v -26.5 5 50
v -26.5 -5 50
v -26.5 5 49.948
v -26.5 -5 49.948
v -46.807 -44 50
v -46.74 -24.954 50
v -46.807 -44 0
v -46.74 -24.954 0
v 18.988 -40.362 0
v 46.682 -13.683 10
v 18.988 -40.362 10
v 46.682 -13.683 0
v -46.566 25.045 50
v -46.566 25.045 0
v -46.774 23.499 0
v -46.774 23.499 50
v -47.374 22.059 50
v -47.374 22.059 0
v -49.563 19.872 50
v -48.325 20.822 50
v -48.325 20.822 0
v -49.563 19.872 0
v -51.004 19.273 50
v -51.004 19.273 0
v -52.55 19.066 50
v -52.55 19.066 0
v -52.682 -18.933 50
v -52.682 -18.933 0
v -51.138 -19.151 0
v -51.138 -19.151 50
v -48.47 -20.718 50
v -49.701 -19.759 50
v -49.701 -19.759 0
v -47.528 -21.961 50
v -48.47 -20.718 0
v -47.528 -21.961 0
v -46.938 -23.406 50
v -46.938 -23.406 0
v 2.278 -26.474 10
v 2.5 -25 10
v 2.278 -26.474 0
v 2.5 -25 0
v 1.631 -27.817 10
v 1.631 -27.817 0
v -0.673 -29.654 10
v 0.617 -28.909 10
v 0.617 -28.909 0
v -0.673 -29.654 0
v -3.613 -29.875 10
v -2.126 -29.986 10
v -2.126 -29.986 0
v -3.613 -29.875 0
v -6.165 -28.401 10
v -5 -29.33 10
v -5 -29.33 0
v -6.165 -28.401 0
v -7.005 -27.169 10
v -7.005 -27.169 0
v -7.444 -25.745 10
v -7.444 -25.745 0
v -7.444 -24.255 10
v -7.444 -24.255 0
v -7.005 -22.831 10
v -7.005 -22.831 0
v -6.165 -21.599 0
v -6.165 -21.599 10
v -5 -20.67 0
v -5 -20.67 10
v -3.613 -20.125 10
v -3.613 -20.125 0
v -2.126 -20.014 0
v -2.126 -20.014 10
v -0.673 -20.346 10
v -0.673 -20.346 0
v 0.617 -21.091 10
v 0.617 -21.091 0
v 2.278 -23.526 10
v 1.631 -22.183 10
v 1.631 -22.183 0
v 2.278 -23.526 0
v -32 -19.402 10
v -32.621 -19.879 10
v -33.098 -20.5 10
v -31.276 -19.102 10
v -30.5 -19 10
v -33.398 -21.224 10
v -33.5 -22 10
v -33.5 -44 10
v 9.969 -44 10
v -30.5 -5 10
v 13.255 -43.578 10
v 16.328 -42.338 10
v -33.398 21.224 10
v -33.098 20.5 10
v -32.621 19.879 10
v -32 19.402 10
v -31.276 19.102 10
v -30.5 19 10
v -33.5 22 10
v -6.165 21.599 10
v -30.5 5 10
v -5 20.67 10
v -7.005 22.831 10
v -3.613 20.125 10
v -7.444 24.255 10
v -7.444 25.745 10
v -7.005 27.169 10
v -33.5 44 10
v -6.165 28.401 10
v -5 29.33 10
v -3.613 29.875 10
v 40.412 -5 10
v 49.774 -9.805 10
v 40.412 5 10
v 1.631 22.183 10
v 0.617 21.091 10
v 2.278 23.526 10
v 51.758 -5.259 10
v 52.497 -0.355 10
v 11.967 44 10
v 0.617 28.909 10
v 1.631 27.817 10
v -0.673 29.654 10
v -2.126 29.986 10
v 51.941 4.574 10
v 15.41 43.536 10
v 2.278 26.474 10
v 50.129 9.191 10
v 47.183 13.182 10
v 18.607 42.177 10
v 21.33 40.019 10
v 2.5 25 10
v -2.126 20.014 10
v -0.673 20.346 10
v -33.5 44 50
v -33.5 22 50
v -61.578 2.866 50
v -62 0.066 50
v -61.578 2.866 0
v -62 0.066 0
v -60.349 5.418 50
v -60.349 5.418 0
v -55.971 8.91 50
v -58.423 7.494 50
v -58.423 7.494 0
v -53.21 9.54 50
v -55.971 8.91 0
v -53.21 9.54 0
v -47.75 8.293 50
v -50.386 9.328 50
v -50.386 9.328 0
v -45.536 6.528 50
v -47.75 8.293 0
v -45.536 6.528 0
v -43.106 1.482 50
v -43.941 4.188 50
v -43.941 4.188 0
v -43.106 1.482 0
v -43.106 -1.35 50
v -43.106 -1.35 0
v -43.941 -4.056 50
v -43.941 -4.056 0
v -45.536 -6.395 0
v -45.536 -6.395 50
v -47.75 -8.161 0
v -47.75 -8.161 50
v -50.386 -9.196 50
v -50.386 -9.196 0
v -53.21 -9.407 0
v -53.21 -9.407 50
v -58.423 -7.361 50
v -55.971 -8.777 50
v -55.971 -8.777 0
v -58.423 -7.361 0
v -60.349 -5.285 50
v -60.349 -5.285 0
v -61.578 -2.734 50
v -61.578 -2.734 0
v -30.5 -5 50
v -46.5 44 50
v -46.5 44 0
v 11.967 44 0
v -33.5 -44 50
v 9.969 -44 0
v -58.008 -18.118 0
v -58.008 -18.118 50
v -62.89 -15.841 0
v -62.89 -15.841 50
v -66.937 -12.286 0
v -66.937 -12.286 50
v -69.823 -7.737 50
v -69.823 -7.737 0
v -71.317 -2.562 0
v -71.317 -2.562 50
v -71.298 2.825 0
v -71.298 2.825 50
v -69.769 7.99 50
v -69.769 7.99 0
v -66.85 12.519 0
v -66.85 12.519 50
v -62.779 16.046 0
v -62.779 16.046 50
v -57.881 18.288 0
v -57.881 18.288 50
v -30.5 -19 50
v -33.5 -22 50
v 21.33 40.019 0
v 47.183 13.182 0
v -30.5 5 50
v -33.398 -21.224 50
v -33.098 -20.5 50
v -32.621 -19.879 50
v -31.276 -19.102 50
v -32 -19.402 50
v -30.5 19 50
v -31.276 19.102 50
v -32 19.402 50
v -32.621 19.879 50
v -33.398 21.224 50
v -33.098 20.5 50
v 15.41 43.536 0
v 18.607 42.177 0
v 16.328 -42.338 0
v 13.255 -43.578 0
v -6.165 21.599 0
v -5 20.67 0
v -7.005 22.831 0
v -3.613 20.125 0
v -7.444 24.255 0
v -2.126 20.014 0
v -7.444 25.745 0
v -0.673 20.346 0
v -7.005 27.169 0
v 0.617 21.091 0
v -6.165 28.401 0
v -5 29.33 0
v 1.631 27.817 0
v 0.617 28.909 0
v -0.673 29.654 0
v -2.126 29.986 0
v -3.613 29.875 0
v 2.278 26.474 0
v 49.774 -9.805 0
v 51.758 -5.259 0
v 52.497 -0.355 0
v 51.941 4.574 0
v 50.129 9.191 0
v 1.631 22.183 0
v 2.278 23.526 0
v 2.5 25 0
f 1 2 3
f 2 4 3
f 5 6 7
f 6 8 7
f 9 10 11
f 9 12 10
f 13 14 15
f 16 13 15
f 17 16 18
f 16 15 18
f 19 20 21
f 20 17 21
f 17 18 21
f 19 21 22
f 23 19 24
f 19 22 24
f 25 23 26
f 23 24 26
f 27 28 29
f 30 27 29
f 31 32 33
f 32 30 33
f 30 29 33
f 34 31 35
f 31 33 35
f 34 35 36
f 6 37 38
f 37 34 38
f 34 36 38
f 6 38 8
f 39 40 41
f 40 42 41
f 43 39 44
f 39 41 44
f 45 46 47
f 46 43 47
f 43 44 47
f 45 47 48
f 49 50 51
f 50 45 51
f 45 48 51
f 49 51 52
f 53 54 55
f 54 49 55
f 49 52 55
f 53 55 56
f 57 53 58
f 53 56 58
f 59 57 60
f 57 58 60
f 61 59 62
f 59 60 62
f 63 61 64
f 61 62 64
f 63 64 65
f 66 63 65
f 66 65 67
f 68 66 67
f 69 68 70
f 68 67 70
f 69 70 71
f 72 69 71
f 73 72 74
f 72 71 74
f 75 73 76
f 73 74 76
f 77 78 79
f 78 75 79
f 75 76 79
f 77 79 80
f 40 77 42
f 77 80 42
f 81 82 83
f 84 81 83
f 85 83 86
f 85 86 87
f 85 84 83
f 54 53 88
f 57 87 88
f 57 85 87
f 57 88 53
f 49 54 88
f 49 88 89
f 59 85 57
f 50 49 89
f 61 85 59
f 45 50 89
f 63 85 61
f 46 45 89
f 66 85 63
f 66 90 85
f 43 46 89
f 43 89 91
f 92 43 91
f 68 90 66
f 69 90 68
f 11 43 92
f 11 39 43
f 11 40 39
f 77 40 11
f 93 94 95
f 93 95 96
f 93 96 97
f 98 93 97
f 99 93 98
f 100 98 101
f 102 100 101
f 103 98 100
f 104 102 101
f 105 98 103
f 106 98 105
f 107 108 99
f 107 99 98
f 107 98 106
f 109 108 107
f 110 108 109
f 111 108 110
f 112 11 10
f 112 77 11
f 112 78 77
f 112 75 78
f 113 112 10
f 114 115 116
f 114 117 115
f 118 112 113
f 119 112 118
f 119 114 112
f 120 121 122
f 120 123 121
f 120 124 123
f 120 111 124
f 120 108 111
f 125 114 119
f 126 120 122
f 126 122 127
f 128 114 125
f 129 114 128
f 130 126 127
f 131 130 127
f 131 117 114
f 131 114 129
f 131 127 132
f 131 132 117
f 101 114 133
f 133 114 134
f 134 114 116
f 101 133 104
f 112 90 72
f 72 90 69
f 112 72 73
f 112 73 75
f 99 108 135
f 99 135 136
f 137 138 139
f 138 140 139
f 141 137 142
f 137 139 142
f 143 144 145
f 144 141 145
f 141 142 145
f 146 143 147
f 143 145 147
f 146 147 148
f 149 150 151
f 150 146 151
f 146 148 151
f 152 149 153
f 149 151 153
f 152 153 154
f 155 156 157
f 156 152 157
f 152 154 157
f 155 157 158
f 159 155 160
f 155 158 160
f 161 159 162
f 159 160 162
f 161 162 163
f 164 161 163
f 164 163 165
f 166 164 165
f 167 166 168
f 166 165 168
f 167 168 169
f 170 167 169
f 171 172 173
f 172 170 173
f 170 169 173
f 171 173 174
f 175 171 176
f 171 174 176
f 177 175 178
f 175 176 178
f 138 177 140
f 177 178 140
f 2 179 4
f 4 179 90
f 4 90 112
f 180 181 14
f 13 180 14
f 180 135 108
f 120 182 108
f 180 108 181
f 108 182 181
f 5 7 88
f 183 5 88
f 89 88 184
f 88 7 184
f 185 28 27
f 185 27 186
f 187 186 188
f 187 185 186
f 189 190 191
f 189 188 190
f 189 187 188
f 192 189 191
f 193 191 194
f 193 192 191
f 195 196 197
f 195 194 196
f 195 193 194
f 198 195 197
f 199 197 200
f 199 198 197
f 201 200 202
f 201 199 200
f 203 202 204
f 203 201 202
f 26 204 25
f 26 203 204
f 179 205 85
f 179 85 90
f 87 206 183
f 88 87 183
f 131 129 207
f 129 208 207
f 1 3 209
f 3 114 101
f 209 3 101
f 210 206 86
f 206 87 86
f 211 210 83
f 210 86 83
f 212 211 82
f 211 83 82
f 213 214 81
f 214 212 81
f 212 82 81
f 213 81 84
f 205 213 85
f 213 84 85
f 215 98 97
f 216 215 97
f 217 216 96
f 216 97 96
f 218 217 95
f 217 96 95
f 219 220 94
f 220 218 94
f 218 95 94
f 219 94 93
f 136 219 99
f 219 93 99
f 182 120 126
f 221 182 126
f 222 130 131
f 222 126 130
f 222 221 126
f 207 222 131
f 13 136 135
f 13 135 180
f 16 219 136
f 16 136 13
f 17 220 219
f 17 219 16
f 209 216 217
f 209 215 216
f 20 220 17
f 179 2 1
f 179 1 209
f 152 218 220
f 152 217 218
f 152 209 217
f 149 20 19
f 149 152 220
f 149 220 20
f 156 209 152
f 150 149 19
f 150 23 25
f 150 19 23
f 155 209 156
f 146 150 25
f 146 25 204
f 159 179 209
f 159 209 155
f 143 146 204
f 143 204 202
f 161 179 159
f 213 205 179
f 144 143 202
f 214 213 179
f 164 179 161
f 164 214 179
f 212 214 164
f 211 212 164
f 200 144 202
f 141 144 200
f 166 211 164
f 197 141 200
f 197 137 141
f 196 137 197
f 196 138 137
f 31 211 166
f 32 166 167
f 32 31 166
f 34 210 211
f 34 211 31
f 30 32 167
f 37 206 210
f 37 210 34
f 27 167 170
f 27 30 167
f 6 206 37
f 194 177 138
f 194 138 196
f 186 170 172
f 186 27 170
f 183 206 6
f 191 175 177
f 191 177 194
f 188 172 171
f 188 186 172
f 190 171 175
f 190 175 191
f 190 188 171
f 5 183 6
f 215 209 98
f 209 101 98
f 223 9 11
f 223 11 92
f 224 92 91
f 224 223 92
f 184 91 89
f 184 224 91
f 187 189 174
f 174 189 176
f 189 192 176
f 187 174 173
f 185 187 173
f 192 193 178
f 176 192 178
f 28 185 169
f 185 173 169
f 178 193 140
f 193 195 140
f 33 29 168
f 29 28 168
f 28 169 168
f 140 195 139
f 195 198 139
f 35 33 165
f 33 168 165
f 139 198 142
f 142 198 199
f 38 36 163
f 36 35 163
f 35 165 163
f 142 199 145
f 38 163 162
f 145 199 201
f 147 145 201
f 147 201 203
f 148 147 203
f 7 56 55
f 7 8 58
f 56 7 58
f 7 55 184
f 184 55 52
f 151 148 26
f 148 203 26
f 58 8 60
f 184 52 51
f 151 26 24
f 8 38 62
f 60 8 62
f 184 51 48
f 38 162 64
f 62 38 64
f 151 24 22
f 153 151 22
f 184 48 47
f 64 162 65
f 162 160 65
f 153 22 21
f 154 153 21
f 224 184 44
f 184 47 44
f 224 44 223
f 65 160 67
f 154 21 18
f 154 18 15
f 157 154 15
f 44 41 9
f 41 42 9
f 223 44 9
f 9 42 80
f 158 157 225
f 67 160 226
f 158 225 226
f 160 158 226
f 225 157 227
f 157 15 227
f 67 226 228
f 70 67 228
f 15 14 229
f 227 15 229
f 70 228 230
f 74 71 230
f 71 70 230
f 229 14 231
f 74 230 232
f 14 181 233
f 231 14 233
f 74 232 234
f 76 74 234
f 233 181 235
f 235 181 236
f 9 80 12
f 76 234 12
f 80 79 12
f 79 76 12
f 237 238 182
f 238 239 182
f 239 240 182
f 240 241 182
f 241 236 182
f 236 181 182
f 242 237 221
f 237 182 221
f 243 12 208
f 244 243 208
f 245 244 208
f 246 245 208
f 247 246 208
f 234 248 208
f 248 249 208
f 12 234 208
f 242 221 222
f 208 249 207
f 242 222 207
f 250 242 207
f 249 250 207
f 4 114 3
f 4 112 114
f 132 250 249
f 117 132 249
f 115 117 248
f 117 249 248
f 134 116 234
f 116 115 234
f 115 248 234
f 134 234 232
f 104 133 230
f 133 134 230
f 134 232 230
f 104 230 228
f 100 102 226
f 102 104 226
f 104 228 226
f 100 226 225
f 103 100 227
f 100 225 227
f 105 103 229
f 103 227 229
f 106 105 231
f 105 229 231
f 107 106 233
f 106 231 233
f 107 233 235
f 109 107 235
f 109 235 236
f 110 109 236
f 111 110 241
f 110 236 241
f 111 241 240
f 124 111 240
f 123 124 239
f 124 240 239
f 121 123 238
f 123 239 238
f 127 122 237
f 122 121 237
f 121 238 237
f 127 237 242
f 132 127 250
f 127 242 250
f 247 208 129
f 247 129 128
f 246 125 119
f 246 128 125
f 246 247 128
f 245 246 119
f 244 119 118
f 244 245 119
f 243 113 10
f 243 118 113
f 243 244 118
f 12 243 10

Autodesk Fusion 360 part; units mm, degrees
sketch "Sketch1" plane through (0, 0, 0) normal (0, 0, 1) x (1, 0, 0)
  line L0 (9.969, -44) -> (-33.5, -44)
  line L1 (-33.5, -44) -> (-33.5, 44)
  line L2 (-33.5, 44) -> (11.9673, 44)
  arc A0 (46.682, -13.6834) -> (47.1834, 13.182) centre (33.5, 0) ccw
  line L3 (46.682, -13.6834) -> (18.9882, -40.3623)
  line L4 (47.1834, 13.182) -> (21.3296, 40.0192)
  circle A1 centre (-2.5, 25) radius 5
  circle A2 centre (-2.5, -25) radius 5
  arc A3 (21.3296, 40.0192) -> (11.9673, 44) centre (11.9673, 31) ccw
  line L5 (33.5, 27.3859) -> (33.5, 25)
  line L6 (33.5, -25) -> (33.5, -26.3823)
  line L7 (-2.5, -25) -> (-1.5636, -25) construction
  arc A4 (9.969, -44) -> (18.9882, -40.3623) centre (9.969, -31) ccw
  dimension "d4" = 88
  dimension "d6" = 19
  dimension "d10" = 10
  dimension "d11" = 10
extrude "Extrude1" add sketch "Sketch1" along normal blind 10 makes body 1
sketch "Sketch2" plane through (0, 0, 10) normal (0, 0, 1) x (-1, 0, 0)
  circle A0 centre (2.5, -25) radius 5
  circle A1 centre (2.5, 25) radius 5
  line L0 (33.5, 44) -> (-9.969, 44)
  arc A2 (-9.969, 44) -> (-18.9882, 40.3623) centre (-9.969, 31) ccw
  line L1 (-18.9882, 40.3623) -> (-46.682, 13.6834)
  arc A3 (-46.682, 13.6834) -> (-47.1834, -13.182) centre (-33.5, 0) ccw
  line L2 (-47.1834, -13.182) -> (-21.3296, -40.0192)
  arc A4 (-21.3296, -40.0192) -> (-11.9673, -44) centre (-11.9673, -31) ccw
  line L3 (-11.9673, -44) -> (33.5, -44)
  line L4 (33.5, -44) -> (33.5, 44)
  line L5 (46.8066, 44) -> (33.5, 44)
  line L6 (30.5, 19) -> (30.5, 5)
  line L7 (30.5, 5) -> (26.5, 5)
  line L8 (26.5, 5) -> (26.5, -5)
  line L9 (26.5, -5) -> (30.5, -5)
  line L10 (30.5, -5) -> (30.5, -19)
  line L11 (33.5, -44) -> (46.5, -44)
  line L12 (33.5, 0) -> (52.4999, -0.0662) construction
  circle A5 centre (52.4999, -0.0662) radius 9.5
  line L13 (46.5, -44) -> (46.566, -25.0452)
  line L14 (46.7402, 24.9536) -> (46.8066, 44)
  arc A6 (52.5501, -19.0661) -> (52.6825, 18.9329) centre (52.4999, -0.0662) ccw
  arc A7 (33.5, 0) -> (33.5, -0.1324) centre (52.4999, -0.0662) ccw
  arc A8 (52.5501, -19.0661) -> (46.566, -25.0452) centre (52.566, -25.0661) ccw
  arc A9 (46.7402, 24.9536) -> (52.6825, 18.9329) centre (52.7402, 24.9327) ccw
  arc A10 (33.5, -22) -> (30.5, -19) centre (30.5, -22) ccw
  arc A11 (30.5, 19) -> (33.5, 22) centre (30.5, 22) ccw
  dimension "d17" = 4
  dimension "d19" = 38
  dimension "d21" = 13
  dimension "d22" = 10
  dimension "d23" = 14
  dimension "d25" = 19
  dimension "d27" = 19
  dimension "d28" = 6
  dimension "d29" = 6
  dimension "d30" = 3
  dimension "d31" = 3
extrude "Extrude2" add sketch "Sketch2" against normal blind 10 separate body contours L4 L5 L11 L13 L14 A6 A7 A8 A9 | L4 L6 L7 L8 L9 L10 A7 A10 A11 makes body 2
extrude "Extrude3" add 1 faces at (-37.9134, -30.3179, 10) along direction (0, 0, 1) blind 30 on bodies 2 bodies 2 1
extrude "Extrude5" add 1 faces at (-37.9134, -30.3179, 40) along direction (0, 0, 1) blind 10 on bodies 2 bodies 2
sketch "Sketch4" plane through (0, 0, 0) normal (0, 1, 0) x (1, 0, 0)
  line L0 (-26.5123, -49.9551) -> (-26.5123, -9.9551)
  line L1 (-26.5123, -9.9551) -> (40.4877, -9.9551)
  line L2 (40.4877, -9.9551) -> (-26.5123, -49.9551)
  line L3 (-26.5, -10) -> (-26.5, -50)
  dimension "d43" = 40
  dimension "d44" = 67
  dimension "d45" = 40
extrude "Extrude6" add sketch "Sketch4" along normal mid plane 10 bodies 2
